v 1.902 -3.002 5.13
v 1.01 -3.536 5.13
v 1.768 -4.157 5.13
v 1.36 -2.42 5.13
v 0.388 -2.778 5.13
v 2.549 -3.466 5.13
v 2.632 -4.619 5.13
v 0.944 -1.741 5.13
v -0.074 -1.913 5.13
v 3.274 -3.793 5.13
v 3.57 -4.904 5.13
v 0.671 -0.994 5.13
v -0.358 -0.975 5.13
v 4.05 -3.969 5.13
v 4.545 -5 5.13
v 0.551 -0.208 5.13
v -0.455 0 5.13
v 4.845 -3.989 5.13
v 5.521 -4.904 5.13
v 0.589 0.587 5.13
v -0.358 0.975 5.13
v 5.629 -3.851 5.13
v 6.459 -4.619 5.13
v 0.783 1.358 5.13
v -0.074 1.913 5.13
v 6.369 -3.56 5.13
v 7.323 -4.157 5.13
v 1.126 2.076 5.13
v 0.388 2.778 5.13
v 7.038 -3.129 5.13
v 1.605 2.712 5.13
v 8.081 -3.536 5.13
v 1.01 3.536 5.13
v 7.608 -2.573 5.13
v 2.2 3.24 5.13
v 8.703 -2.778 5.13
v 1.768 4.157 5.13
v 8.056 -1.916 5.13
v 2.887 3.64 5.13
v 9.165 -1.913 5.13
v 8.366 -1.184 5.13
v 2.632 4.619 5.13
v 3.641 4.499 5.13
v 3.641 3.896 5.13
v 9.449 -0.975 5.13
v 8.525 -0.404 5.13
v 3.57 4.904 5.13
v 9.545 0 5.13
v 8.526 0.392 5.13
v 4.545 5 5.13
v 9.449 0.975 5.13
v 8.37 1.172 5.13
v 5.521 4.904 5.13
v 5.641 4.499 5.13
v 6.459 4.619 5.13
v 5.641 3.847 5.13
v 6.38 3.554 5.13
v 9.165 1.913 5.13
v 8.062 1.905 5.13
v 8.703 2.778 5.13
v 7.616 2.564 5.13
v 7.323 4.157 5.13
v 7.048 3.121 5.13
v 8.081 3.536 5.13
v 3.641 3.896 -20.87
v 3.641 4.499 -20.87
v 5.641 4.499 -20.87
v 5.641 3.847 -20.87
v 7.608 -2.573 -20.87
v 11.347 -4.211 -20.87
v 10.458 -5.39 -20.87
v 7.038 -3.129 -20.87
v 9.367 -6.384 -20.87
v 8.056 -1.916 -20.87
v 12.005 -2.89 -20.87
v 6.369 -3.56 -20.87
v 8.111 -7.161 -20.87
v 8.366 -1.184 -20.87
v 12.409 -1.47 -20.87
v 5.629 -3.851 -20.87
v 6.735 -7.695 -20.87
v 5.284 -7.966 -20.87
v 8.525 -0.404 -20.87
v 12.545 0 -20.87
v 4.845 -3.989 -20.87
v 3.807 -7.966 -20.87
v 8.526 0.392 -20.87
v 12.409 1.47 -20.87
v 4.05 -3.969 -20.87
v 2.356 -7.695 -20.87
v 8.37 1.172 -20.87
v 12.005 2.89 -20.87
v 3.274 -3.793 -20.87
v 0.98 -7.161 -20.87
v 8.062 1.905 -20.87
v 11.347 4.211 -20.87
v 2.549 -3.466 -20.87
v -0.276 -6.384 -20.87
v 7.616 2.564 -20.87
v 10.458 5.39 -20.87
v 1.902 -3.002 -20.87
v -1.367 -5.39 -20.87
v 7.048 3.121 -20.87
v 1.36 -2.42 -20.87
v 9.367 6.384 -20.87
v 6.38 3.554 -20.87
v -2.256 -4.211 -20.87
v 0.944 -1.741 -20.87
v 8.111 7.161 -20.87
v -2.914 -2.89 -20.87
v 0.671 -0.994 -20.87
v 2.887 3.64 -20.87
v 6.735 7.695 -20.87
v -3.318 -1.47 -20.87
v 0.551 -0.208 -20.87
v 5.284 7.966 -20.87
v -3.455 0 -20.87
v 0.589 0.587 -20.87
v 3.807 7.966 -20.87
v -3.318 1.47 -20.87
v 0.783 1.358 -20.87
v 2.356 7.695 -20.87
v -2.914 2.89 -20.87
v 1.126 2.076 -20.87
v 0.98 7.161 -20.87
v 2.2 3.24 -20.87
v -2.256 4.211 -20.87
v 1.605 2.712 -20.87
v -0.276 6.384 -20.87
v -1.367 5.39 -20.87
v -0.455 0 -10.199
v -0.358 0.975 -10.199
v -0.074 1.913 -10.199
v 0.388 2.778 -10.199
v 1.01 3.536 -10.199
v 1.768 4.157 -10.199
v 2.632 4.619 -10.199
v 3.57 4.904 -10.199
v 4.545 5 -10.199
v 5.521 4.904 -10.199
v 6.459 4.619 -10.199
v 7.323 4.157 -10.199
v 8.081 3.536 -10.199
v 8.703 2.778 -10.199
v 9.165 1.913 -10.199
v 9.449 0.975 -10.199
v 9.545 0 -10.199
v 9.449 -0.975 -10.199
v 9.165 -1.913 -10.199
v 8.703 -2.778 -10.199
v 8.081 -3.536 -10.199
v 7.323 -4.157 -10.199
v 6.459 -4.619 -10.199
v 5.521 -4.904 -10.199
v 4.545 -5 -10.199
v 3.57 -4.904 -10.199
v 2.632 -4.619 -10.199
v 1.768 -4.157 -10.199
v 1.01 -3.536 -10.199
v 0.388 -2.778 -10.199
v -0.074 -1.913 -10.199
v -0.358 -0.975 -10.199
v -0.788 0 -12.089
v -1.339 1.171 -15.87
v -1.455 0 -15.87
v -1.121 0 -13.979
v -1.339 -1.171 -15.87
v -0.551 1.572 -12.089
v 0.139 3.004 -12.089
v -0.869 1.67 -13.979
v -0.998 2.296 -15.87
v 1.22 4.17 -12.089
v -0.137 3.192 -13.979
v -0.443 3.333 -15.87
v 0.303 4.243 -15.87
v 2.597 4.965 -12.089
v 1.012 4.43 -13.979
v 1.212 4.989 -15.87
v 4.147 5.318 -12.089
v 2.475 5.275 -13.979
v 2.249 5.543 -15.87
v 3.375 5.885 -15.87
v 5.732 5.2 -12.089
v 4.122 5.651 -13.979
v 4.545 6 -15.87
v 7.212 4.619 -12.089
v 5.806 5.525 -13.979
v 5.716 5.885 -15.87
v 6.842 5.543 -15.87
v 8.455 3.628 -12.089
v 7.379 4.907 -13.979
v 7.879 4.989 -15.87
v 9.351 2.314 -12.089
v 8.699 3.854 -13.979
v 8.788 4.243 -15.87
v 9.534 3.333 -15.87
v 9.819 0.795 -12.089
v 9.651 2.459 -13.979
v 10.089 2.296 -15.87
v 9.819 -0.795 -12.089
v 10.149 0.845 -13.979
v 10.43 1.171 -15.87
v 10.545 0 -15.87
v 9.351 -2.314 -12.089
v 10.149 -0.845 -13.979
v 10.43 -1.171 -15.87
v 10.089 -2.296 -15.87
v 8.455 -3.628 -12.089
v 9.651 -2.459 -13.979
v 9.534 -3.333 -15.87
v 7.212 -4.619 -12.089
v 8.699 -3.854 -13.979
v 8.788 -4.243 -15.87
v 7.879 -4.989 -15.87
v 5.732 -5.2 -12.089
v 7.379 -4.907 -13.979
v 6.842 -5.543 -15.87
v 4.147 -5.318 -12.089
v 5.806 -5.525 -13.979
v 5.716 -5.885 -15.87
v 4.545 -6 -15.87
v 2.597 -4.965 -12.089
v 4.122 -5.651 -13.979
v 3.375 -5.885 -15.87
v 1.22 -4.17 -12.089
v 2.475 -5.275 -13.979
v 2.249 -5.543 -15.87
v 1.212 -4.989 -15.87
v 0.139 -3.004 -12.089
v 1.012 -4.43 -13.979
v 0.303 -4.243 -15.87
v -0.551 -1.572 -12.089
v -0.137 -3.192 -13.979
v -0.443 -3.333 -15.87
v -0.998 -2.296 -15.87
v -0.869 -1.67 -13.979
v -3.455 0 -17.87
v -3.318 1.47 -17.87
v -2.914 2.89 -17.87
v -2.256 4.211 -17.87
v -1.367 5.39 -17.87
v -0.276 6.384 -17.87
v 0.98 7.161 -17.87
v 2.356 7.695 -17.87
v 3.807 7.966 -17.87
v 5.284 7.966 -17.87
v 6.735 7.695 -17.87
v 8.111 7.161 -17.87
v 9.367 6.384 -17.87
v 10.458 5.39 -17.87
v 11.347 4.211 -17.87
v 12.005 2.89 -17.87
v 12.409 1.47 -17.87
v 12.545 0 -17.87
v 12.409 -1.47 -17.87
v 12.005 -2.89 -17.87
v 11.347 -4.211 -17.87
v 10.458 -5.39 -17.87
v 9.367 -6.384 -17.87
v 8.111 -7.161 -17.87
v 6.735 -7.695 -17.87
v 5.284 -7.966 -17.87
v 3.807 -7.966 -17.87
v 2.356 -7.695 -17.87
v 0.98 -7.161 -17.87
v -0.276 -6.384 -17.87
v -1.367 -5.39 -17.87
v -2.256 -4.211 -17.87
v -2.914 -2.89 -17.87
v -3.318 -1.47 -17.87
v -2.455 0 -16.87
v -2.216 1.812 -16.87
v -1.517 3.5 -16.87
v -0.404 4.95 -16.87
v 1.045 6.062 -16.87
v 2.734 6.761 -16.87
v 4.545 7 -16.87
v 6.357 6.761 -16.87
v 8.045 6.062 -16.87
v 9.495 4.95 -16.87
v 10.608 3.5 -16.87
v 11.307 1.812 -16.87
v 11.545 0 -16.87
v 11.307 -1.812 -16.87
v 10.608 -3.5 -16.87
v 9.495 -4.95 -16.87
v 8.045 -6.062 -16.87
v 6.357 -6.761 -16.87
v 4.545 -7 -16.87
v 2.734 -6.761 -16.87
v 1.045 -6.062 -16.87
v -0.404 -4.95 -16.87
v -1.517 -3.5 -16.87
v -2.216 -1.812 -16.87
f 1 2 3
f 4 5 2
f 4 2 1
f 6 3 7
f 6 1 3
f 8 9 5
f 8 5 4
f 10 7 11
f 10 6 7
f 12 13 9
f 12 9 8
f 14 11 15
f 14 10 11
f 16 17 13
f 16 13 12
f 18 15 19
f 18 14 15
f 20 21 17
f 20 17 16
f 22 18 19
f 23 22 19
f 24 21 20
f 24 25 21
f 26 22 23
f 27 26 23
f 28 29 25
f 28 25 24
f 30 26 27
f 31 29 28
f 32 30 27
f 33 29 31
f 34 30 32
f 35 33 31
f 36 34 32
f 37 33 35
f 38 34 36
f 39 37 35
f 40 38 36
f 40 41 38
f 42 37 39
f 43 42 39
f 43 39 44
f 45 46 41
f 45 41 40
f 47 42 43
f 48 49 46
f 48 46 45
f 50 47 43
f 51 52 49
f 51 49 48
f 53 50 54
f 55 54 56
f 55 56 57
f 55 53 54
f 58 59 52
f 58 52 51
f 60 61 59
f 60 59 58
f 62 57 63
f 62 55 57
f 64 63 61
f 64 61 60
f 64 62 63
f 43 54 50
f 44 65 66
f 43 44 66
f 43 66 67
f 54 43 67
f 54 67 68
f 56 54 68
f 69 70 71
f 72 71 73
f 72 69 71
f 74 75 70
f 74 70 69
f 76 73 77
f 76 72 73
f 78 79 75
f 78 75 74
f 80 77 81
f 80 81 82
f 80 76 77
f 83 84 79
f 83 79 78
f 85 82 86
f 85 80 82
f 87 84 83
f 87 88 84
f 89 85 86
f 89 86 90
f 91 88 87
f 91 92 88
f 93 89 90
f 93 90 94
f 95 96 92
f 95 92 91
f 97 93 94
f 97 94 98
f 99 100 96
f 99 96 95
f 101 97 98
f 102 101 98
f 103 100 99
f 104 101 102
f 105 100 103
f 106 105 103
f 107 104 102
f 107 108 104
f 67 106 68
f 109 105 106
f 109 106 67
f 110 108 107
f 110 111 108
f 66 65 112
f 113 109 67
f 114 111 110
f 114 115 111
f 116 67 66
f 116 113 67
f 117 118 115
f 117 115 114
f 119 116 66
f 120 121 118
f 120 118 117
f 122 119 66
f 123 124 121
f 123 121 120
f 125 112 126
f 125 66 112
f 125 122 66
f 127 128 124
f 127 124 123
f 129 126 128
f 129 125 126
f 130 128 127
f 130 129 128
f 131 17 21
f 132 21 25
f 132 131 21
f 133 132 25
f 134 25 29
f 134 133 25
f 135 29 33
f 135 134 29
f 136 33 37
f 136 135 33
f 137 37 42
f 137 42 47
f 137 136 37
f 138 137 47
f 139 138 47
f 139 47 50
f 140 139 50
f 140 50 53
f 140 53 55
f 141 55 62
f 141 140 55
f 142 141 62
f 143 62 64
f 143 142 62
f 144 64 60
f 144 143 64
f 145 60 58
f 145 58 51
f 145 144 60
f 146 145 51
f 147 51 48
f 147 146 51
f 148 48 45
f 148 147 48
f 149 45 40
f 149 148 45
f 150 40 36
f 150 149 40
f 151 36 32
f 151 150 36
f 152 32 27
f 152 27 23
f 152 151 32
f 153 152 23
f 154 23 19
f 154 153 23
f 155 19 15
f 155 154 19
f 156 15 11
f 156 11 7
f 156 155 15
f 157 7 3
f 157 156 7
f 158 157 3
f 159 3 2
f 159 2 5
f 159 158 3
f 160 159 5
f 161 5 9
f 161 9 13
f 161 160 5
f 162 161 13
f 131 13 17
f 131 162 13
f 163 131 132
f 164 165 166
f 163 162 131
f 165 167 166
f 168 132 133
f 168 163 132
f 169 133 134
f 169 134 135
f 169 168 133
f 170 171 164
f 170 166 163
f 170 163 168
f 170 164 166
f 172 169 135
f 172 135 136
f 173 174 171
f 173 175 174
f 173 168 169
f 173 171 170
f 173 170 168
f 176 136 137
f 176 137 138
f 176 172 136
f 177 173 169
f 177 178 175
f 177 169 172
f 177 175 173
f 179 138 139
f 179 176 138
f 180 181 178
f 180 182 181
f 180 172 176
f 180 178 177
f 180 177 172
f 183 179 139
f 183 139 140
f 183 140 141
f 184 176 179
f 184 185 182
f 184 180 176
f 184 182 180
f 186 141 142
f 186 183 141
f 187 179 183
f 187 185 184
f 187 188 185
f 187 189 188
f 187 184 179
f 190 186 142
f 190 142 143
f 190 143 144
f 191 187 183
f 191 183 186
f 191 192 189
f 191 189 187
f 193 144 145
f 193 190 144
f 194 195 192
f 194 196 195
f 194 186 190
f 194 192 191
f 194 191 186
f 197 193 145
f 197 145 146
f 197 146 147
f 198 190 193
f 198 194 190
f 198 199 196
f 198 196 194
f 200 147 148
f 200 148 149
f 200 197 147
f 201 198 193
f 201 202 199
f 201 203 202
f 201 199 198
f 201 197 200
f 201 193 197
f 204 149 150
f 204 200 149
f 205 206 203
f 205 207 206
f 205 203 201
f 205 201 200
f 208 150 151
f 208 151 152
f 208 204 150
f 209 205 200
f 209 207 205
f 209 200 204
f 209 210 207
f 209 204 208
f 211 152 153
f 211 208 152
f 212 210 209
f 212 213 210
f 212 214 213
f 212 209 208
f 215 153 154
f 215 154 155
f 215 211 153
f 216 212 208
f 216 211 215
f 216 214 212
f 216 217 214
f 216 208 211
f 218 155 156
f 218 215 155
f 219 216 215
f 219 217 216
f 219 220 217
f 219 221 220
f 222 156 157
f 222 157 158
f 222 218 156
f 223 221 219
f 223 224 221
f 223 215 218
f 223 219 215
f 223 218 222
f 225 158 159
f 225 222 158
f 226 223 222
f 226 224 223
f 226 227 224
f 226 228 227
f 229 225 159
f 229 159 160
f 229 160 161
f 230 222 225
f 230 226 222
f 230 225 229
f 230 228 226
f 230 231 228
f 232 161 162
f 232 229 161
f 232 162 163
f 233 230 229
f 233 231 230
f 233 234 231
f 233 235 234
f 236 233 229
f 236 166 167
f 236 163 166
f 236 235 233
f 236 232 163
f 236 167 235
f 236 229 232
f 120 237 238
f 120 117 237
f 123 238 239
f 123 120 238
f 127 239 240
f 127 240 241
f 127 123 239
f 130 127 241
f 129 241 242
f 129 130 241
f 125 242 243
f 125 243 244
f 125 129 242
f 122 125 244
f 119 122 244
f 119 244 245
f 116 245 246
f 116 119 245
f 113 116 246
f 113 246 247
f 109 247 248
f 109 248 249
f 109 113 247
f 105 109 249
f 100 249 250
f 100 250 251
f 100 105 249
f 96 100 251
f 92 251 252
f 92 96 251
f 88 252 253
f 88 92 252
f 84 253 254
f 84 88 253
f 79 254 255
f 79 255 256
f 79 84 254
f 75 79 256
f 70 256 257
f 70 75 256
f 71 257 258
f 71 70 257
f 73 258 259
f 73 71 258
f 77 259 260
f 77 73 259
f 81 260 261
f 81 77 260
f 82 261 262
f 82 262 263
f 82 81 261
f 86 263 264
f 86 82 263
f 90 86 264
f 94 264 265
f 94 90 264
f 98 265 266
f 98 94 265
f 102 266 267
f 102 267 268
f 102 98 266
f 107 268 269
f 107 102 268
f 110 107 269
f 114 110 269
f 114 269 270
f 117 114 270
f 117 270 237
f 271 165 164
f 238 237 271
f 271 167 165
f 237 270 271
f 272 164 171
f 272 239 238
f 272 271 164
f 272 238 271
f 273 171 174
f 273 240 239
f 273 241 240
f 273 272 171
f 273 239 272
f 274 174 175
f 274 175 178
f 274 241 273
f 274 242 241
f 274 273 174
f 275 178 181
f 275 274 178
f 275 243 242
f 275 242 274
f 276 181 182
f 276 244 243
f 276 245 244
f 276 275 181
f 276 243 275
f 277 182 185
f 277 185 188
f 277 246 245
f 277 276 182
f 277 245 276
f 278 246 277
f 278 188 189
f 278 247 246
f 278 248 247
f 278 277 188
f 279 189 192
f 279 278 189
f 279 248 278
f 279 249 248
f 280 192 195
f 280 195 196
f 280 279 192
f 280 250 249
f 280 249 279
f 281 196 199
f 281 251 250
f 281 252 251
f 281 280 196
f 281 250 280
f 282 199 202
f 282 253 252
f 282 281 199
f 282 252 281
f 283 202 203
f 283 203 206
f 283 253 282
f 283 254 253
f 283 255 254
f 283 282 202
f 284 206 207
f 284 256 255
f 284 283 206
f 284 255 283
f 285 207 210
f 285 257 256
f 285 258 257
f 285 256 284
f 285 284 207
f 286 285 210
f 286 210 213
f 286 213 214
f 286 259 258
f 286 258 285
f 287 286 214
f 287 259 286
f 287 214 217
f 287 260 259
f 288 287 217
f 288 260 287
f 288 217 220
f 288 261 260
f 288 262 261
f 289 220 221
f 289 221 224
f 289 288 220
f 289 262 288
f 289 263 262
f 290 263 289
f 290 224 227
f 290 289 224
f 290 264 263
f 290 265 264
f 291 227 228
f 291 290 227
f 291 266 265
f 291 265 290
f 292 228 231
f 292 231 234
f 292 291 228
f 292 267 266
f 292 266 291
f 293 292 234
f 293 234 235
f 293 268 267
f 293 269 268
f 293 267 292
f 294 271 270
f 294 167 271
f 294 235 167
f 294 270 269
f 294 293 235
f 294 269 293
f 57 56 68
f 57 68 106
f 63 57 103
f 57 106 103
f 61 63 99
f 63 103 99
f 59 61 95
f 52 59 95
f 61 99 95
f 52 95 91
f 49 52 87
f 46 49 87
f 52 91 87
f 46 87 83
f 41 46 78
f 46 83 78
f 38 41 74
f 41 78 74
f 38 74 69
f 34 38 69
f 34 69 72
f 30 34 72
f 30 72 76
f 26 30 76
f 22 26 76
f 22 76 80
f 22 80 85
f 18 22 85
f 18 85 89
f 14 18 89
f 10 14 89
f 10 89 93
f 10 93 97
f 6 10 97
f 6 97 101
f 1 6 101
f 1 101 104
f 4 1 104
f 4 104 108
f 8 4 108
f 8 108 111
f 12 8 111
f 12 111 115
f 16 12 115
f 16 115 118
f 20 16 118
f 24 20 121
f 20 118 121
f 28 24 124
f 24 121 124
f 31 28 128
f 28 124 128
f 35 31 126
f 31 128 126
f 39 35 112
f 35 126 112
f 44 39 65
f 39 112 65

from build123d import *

# Parameters (mm, degrees)
F3_DEPTH = 30


with BuildPart() as f1:
    # F0 (on Front) → F1 (revolve)
    with BuildSketch(Plane.XZ):
        Polygon((-3.454545, -17.869791), (-3.454545, -20.869791), (-0.454545, -20.869791), (4.545455, -20.869791), (4.545455, 5.130209), (-0.454545, 5.130209), (-0.454545, -10.198509), (-1.454545, -15.869791), align=None)
    revolve(axis=Axis((4.545455, 0, -7.869791), (0, 0, -1)))

    # F2 (on face) → F3 (cut)
    with BuildSketch(Plane(origin=(0, 0, -20.869791), x_dir=(1, 0, 0), z_dir=(0, 0, -1))):
        with BuildLine():
            Line((5.640719, -4.498865), (5.640719, -3.847128))
            ThreePointArc((5.640719, -3.847128), (4.447064, 3.99879), (3.640719, -3.896339))
            Line((3.640719, -3.896339), (3.640719, -4.498865))
            Line((3.640719, -4.498865), (5.640719, -4.498865))
        make_face()
    extrude(amount=-F3_DEPTH, mode=Mode.SUBTRACT)


solid = f1.part
